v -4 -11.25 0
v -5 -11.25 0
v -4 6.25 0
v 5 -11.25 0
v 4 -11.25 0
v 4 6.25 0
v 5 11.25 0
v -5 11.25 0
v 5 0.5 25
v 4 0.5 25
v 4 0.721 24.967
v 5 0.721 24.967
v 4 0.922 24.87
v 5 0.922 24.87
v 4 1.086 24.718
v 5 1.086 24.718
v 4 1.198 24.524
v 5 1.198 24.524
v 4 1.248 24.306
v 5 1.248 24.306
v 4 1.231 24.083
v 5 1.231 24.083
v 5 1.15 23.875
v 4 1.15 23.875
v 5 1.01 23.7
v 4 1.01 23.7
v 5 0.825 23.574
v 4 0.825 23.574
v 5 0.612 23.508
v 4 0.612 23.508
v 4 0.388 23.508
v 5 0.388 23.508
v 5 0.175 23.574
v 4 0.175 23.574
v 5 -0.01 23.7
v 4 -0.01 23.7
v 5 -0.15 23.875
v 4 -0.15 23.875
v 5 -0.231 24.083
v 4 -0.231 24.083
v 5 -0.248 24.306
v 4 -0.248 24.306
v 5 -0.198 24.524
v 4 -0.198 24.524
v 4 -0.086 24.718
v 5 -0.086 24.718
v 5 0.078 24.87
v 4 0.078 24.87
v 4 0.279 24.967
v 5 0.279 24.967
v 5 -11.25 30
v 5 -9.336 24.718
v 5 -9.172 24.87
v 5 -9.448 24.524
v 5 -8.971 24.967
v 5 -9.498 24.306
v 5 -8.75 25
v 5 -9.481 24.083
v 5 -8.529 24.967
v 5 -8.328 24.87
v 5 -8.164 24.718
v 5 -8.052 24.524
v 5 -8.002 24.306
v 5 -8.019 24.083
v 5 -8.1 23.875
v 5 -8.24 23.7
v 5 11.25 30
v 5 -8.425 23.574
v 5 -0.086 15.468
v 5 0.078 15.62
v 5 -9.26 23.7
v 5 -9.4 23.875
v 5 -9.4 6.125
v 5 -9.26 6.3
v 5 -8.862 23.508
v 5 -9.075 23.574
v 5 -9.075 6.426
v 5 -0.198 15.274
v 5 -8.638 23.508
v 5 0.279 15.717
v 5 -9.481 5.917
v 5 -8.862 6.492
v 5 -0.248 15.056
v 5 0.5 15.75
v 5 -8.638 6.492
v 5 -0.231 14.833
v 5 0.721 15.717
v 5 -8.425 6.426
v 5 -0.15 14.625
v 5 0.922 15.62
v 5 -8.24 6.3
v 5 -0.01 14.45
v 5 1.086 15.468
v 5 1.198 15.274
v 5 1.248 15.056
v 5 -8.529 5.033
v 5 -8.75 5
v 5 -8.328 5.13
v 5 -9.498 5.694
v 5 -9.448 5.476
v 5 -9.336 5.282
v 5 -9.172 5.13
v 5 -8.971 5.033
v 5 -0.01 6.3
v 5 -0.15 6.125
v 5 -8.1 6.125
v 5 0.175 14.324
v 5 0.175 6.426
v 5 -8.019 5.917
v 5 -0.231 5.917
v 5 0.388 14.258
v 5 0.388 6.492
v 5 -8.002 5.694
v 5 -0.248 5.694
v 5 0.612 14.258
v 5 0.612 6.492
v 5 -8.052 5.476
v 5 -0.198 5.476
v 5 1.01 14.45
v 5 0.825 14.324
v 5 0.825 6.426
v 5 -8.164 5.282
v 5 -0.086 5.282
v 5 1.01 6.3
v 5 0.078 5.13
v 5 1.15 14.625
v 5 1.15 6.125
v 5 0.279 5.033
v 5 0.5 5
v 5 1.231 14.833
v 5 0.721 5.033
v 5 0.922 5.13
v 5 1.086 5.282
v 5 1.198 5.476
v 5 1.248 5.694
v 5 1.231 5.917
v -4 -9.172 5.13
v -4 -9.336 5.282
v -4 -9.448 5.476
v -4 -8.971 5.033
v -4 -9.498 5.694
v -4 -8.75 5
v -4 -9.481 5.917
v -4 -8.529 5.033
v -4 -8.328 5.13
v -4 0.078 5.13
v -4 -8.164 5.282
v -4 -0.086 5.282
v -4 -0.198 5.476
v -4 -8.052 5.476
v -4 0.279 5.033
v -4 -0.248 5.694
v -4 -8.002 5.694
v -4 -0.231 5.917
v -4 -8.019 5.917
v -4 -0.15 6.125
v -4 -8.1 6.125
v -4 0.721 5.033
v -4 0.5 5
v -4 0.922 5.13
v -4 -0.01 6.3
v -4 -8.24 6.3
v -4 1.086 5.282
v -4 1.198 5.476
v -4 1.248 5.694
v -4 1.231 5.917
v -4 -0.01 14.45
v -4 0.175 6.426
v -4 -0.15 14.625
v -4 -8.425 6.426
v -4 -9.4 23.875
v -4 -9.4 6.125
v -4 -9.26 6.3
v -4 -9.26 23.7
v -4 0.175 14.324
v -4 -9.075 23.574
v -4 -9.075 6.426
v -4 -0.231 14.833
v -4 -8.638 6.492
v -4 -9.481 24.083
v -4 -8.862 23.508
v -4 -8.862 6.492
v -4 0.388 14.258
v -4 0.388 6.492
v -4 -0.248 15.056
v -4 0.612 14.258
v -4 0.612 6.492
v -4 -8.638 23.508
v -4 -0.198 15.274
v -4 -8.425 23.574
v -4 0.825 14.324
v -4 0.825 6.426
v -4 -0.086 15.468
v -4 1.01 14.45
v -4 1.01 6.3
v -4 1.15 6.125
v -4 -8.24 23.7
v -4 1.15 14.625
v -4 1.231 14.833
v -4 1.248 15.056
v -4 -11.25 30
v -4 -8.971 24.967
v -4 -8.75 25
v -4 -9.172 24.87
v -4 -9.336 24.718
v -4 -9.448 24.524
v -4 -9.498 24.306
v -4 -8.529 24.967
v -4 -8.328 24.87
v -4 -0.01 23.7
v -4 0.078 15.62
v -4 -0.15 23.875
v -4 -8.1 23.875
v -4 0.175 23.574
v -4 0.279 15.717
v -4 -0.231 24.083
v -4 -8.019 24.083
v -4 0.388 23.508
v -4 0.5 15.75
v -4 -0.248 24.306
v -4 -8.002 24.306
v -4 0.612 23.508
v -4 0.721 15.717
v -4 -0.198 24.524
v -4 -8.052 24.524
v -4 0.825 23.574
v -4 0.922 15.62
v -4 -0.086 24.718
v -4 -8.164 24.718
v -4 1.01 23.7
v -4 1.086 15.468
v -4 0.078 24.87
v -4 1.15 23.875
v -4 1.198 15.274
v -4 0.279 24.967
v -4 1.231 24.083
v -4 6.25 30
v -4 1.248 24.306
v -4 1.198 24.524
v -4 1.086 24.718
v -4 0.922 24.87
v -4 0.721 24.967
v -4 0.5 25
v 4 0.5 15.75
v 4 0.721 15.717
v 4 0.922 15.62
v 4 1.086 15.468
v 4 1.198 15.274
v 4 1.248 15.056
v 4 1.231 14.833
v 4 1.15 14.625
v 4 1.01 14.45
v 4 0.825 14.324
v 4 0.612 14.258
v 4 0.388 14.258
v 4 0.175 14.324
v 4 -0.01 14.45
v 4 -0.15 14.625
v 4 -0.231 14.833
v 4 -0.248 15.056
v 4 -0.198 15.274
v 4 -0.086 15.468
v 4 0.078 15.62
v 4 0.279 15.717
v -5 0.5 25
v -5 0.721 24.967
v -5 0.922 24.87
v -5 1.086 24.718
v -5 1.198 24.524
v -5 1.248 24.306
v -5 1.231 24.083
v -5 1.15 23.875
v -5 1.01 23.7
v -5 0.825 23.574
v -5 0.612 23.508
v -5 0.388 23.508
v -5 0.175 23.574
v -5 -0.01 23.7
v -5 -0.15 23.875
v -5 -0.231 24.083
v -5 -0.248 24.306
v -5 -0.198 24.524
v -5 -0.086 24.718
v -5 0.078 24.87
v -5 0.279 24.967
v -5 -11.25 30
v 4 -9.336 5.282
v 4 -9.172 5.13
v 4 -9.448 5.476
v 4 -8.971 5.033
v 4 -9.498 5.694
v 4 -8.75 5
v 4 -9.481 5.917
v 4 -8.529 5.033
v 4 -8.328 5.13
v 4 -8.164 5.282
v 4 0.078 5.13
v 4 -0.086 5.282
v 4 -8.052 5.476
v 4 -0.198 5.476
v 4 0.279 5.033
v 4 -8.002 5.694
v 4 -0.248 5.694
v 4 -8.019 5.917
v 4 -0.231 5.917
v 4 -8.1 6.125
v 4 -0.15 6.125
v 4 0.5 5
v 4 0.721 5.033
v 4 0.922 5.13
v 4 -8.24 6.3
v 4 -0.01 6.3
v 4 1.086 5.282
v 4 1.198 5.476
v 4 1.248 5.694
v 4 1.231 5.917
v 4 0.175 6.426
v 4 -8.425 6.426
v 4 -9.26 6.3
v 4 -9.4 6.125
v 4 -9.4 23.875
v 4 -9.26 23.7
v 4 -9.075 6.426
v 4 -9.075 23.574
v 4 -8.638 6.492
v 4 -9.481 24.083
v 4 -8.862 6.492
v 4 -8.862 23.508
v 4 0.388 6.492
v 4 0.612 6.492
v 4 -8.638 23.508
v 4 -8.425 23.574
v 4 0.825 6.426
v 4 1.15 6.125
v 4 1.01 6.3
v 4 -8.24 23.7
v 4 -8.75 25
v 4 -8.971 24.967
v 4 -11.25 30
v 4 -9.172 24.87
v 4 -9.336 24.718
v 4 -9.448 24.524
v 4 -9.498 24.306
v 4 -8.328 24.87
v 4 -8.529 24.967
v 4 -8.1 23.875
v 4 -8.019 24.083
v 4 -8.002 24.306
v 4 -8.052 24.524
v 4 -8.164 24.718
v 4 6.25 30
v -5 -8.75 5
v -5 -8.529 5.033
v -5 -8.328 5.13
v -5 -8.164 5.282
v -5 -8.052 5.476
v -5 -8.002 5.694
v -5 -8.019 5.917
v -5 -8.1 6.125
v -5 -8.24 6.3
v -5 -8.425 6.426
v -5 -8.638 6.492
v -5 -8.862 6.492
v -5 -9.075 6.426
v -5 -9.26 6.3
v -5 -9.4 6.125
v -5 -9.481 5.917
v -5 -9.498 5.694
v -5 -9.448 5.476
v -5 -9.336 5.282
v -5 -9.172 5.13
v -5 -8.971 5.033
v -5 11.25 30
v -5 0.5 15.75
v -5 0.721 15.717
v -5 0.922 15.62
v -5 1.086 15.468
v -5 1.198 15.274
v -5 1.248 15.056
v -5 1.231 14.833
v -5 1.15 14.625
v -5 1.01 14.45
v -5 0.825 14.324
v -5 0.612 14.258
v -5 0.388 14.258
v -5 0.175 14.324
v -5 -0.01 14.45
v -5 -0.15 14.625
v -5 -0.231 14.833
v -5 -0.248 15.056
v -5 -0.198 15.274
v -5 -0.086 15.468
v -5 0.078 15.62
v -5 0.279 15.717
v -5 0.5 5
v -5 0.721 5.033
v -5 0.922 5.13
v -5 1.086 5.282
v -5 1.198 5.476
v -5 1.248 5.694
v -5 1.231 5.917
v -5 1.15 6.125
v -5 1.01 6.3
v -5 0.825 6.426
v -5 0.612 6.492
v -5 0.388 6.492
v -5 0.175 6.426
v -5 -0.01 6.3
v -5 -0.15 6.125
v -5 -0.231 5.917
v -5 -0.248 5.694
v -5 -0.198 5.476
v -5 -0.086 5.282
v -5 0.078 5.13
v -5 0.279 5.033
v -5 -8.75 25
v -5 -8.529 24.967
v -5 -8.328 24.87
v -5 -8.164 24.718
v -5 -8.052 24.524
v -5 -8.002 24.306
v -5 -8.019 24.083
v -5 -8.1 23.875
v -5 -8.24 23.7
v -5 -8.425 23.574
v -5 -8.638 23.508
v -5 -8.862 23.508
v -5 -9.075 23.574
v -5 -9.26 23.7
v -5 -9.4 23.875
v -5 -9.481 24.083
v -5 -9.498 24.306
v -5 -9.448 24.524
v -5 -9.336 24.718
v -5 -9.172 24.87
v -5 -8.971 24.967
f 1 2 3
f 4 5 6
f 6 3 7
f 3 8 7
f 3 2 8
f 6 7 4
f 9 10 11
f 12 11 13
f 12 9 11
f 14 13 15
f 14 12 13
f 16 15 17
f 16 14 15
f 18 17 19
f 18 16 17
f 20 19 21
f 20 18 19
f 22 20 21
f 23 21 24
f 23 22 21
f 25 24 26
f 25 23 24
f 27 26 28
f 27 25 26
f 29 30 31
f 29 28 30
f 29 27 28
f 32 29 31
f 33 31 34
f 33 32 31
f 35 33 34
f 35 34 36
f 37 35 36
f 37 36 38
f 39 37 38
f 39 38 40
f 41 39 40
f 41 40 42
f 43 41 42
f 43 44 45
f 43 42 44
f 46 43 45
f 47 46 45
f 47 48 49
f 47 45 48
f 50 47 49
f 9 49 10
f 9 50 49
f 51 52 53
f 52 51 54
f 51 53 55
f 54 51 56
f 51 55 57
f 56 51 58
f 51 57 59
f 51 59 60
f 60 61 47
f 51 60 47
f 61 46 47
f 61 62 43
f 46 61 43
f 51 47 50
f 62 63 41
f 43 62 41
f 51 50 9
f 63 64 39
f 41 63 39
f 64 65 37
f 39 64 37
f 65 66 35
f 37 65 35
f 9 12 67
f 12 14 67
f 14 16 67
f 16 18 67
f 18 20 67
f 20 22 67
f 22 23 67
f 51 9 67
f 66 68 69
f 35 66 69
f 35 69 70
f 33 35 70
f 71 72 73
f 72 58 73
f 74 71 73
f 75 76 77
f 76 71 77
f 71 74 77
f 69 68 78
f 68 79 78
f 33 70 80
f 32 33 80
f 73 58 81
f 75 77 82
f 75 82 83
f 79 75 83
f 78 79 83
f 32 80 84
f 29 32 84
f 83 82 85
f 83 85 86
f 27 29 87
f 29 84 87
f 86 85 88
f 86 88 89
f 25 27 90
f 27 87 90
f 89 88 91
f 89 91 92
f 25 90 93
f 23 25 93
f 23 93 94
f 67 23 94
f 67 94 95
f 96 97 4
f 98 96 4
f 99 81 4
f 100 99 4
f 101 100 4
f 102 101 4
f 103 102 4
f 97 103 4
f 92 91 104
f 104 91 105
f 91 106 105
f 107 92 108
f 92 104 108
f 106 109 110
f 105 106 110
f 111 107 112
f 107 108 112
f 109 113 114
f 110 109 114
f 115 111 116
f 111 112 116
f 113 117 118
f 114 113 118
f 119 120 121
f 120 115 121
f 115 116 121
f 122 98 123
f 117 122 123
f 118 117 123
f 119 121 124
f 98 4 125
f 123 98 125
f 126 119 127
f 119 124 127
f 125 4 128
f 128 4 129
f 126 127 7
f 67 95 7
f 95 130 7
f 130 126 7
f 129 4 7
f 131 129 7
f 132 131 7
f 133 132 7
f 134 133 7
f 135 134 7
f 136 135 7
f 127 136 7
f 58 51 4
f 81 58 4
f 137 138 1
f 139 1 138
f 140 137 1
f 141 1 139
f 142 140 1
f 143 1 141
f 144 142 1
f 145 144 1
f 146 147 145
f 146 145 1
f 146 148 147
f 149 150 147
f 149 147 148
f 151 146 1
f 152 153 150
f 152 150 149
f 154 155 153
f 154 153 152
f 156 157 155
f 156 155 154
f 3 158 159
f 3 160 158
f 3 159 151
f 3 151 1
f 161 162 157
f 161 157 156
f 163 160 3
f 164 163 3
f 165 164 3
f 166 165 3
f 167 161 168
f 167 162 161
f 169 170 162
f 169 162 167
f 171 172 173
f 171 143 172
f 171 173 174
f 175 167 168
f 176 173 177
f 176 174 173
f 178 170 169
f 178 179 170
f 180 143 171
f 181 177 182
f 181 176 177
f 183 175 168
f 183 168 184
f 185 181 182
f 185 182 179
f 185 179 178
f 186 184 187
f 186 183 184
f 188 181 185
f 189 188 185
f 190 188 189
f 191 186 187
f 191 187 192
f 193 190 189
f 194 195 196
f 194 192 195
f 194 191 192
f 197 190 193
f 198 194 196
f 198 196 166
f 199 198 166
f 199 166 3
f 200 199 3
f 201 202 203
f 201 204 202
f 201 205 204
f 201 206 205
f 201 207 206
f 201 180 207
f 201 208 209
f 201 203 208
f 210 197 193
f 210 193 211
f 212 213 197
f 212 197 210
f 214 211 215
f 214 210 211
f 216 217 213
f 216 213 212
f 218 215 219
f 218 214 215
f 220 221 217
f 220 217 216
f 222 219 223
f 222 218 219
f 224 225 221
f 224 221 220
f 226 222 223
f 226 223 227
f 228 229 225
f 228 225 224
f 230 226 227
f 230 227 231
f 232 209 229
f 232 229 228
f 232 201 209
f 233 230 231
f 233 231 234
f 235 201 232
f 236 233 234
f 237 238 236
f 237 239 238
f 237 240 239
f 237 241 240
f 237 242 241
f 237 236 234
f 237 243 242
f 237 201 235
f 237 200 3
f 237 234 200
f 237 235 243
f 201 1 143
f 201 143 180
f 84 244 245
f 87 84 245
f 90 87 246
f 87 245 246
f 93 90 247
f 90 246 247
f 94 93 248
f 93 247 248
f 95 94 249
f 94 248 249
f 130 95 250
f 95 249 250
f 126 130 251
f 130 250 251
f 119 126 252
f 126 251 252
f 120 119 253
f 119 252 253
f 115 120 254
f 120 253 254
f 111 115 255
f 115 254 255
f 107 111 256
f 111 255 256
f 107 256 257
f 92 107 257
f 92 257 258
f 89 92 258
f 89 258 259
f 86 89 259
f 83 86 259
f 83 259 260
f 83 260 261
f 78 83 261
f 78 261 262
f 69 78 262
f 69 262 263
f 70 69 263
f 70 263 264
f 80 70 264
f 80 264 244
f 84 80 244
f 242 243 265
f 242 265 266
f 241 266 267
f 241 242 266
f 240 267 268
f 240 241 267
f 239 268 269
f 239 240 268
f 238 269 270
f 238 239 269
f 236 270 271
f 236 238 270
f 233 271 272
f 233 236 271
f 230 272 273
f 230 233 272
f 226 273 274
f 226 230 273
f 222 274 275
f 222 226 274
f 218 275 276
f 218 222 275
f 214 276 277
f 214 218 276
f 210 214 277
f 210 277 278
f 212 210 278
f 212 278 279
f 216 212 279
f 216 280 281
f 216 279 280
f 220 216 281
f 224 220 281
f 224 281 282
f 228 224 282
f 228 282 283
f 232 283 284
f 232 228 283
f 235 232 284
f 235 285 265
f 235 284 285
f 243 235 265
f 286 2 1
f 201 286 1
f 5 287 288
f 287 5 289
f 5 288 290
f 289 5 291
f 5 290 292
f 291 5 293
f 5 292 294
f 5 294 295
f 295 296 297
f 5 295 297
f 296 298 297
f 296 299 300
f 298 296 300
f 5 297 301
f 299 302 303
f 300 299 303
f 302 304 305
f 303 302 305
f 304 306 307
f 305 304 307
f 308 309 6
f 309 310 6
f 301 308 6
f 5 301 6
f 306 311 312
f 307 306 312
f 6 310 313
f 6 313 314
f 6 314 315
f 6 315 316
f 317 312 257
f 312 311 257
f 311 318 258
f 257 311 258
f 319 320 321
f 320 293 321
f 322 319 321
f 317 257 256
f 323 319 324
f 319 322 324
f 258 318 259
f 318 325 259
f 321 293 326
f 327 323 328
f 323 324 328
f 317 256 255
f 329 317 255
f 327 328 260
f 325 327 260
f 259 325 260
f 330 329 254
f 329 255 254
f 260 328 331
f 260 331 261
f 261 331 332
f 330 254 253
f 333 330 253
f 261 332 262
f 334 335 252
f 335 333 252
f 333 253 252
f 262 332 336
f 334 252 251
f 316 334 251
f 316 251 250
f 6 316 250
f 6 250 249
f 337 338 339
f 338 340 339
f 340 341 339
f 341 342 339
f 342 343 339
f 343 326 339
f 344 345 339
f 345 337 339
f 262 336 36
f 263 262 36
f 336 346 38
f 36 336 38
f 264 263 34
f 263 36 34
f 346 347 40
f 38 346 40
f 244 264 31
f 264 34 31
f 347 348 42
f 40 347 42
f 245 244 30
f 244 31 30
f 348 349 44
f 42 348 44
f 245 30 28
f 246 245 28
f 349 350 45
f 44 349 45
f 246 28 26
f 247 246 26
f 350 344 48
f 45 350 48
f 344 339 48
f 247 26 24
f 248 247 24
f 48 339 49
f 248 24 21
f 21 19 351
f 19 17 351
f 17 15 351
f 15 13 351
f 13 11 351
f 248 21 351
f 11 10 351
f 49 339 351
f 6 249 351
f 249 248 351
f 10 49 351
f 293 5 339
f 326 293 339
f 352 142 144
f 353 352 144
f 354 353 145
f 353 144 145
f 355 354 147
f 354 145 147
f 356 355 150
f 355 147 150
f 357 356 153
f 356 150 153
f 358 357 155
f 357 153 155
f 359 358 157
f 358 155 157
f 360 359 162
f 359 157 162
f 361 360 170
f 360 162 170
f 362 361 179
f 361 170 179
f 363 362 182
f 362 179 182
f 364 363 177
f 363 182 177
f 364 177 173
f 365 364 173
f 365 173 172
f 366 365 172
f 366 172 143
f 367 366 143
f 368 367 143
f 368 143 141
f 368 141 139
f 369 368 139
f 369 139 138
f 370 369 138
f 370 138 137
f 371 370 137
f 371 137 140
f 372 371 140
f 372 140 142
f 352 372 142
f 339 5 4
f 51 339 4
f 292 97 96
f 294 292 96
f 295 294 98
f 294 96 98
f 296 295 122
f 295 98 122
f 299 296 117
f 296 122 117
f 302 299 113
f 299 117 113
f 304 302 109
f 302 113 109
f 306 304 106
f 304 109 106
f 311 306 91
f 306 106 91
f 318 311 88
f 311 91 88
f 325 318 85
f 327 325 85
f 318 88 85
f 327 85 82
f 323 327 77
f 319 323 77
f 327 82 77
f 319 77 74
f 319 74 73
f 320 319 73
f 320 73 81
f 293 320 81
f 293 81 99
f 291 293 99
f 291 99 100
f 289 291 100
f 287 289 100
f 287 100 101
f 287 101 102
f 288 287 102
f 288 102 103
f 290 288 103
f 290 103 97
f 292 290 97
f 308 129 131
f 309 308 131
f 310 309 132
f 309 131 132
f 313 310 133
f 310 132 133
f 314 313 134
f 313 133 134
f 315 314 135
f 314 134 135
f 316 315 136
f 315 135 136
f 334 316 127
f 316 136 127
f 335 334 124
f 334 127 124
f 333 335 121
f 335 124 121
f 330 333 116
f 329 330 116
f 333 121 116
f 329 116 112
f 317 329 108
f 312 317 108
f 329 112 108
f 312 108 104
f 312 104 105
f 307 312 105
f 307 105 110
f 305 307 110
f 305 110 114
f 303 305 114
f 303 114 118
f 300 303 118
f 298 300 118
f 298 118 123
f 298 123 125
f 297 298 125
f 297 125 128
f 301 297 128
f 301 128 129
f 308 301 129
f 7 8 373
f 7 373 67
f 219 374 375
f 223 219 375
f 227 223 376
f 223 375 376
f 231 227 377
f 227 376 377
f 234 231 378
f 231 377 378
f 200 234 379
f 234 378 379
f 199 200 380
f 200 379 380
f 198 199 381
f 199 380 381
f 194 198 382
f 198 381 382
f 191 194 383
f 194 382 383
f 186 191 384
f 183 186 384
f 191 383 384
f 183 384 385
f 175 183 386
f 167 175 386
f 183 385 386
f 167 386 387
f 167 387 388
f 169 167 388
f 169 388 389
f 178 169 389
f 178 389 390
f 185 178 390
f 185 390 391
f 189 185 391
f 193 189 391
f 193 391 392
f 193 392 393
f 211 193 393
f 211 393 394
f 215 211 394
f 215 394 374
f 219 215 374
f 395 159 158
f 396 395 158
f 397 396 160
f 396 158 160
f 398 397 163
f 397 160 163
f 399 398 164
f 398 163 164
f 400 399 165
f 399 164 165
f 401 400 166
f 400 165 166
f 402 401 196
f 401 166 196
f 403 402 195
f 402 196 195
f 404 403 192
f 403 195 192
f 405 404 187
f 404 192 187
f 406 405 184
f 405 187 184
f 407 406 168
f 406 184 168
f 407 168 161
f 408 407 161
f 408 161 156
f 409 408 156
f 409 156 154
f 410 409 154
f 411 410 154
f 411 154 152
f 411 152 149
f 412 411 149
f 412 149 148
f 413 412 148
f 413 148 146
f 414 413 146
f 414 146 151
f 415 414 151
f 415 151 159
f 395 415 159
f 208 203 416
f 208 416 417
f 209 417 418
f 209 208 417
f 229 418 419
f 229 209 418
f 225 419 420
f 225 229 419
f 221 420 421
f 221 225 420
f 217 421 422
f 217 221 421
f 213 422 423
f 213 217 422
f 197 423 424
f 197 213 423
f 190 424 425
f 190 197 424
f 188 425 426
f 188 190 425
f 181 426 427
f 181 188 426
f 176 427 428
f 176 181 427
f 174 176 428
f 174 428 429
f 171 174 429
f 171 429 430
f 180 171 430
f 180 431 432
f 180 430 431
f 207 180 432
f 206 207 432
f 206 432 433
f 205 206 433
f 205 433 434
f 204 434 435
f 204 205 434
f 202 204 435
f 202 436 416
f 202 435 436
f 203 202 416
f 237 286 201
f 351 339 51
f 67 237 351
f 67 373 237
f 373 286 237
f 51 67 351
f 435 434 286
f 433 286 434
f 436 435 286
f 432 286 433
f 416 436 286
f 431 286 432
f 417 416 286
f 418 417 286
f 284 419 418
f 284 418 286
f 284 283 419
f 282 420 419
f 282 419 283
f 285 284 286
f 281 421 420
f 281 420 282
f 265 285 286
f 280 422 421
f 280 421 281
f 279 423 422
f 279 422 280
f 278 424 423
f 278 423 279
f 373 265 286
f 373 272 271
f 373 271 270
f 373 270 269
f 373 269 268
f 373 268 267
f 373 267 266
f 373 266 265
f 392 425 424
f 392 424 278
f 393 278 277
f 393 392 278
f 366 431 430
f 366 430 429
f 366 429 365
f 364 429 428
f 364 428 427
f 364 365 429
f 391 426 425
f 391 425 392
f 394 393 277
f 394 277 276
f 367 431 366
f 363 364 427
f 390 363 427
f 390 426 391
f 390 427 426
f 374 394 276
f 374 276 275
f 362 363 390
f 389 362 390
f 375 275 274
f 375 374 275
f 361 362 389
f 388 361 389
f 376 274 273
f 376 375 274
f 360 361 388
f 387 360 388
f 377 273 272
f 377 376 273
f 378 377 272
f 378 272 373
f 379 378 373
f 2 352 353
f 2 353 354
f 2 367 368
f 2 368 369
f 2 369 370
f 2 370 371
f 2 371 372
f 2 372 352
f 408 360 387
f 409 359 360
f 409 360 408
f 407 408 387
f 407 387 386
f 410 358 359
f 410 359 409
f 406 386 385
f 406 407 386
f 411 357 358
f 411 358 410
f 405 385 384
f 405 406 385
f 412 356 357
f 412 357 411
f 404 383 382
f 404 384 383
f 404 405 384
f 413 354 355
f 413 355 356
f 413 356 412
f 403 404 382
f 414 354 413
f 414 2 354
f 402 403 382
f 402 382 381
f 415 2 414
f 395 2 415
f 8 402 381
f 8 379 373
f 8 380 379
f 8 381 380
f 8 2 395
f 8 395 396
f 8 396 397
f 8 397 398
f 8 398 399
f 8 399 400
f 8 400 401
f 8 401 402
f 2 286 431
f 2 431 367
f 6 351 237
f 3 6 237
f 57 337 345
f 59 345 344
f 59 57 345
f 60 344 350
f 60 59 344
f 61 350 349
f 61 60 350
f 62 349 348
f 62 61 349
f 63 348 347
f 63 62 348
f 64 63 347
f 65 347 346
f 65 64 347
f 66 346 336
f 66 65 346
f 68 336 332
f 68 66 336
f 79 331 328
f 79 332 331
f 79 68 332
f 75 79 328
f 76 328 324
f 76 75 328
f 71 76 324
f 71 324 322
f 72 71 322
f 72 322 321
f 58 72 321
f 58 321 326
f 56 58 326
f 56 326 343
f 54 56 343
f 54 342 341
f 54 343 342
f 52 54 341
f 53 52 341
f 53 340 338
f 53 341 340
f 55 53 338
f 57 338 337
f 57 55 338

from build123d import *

# Parameters (mm, degrees)
SKETCH1_W           = 10
SKETCH1_H           = 22.5
BOSS_EXTRUDE1_DEPTH = 30
CUT_EXTRUDE1_REACH  = 34.428
SKETCH2_W           = 4
SKETCH2_H           = 17.5
SKETCH3_R           = 0.75
CUT_EXTRUDE2_DEPTH  = 34.564303955
SKETCH4_R           = 0.75
CUT_EXTRUDE3_DEPTH  = 34.564303955


with BuildPart() as part:
    # Sketch1 → Boss-Extrude1 (new body)
    with BuildSketch(Plane.XY):
        Rectangle(SKETCH1_W, SKETCH1_H)
    extrude(amount=BOSS_EXTRUDE1_DEPTH)

    # Sketch2 → Cut-Extrude1 (cut, up to next)
    with BuildSketch(Plane.XY.offset(30), mode=Mode.PRIVATE) as cut_extrude1_sk1:
        with Locations((-2, -2.5)):
            Rectangle(SKETCH2_W, SKETCH2_H)
    cut_extrude1_tool1 = extrude(cut_extrude1_sk1.sketch, amount=-CUT_EXTRUDE1_REACH, mode=Mode.PRIVATE) & part.part
    cut_extrude1 = cut_extrude1_tool1.solids().sort_by_distance((-2, -2.5, 30))[0]
    add(cut_extrude1, mode=Mode.SUBTRACT)

    # Mirror1: Cut-Extrude1 across plane
    add(cut_extrude1.mirror(Plane(origin=(0, 0, 0), x_dir=(0, 0, 1), z_dir=(1, 0, 0))), mode=Mode.SUBTRACT)

    # Sketch3 → Cut-Extrude2 (cut, through all)
    with BuildSketch(Plane(origin=(5, 0, 0), x_dir=(0, 0, -1), z_dir=(1, 0, 0))):
        with Locations((-5.75, -8.75)):
            Circle(SKETCH3_R)
        with Locations((-5.75, 0.5)):
            Circle(SKETCH3_R)
    cut_extrude2 = extrude(amount=-CUT_EXTRUDE2_DEPTH, mode=Mode.SUBTRACT)

    # Mirror2: Cut-Extrude2 across plane
    add(cut_extrude2.mirror(Plane.XY.offset(15)), mode=Mode.SUBTRACT)

    # Sketch4 → Cut-Extrude3 (cut, through all)
    with BuildSketch(Plane.ZY.offset(5)):
        with Locations((15, 0.5)):
            Circle(SKETCH4_R)
    extrude(amount=-CUT_EXTRUDE3_DEPTH, mode=Mode.SUBTRACT)


solid = part.part
